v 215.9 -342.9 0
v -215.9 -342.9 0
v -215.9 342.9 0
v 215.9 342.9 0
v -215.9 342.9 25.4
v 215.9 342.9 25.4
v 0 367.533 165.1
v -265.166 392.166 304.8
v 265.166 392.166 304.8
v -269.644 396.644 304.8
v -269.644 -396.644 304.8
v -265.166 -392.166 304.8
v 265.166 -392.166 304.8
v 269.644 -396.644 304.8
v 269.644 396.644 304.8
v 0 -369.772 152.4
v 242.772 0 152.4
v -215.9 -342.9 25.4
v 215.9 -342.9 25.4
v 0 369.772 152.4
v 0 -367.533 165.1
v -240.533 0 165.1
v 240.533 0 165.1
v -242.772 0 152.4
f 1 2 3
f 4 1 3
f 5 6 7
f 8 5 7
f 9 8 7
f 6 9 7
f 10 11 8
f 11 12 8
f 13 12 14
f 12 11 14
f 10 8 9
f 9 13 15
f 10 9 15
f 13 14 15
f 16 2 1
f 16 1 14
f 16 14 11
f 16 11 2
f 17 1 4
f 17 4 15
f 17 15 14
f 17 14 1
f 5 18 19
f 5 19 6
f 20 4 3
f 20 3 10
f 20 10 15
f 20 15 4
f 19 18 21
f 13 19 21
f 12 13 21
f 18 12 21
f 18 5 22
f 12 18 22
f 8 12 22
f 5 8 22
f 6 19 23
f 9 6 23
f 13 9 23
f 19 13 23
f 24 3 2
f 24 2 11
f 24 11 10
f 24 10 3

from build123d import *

# Parameters (mm, degrees)
F0_W     = 431.8
F0_H     = 685.8
F1_DEPTH = 304.8
F1_TAPER = -10
F3_W     = 431.8
F3_H     = 685.8
F4_DEPTH = 279.4
F4_TAPER = -10


with BuildPart() as f1:
    # F0 (on Top) → F1 (new body)
    with BuildSketch(Plane.XY):
        Rectangle(F0_W, F0_H)
    extrude(amount=F1_DEPTH, taper=F1_TAPER)

    # F3 (on offset) → F4 (cut)
    with BuildSketch(Plane.XY.offset(25.4)):
        Rectangle(F3_W, F3_H)
    extrude(amount=F4_DEPTH, taper=F4_TAPER, mode=Mode.SUBTRACT)


solid = f1.part
